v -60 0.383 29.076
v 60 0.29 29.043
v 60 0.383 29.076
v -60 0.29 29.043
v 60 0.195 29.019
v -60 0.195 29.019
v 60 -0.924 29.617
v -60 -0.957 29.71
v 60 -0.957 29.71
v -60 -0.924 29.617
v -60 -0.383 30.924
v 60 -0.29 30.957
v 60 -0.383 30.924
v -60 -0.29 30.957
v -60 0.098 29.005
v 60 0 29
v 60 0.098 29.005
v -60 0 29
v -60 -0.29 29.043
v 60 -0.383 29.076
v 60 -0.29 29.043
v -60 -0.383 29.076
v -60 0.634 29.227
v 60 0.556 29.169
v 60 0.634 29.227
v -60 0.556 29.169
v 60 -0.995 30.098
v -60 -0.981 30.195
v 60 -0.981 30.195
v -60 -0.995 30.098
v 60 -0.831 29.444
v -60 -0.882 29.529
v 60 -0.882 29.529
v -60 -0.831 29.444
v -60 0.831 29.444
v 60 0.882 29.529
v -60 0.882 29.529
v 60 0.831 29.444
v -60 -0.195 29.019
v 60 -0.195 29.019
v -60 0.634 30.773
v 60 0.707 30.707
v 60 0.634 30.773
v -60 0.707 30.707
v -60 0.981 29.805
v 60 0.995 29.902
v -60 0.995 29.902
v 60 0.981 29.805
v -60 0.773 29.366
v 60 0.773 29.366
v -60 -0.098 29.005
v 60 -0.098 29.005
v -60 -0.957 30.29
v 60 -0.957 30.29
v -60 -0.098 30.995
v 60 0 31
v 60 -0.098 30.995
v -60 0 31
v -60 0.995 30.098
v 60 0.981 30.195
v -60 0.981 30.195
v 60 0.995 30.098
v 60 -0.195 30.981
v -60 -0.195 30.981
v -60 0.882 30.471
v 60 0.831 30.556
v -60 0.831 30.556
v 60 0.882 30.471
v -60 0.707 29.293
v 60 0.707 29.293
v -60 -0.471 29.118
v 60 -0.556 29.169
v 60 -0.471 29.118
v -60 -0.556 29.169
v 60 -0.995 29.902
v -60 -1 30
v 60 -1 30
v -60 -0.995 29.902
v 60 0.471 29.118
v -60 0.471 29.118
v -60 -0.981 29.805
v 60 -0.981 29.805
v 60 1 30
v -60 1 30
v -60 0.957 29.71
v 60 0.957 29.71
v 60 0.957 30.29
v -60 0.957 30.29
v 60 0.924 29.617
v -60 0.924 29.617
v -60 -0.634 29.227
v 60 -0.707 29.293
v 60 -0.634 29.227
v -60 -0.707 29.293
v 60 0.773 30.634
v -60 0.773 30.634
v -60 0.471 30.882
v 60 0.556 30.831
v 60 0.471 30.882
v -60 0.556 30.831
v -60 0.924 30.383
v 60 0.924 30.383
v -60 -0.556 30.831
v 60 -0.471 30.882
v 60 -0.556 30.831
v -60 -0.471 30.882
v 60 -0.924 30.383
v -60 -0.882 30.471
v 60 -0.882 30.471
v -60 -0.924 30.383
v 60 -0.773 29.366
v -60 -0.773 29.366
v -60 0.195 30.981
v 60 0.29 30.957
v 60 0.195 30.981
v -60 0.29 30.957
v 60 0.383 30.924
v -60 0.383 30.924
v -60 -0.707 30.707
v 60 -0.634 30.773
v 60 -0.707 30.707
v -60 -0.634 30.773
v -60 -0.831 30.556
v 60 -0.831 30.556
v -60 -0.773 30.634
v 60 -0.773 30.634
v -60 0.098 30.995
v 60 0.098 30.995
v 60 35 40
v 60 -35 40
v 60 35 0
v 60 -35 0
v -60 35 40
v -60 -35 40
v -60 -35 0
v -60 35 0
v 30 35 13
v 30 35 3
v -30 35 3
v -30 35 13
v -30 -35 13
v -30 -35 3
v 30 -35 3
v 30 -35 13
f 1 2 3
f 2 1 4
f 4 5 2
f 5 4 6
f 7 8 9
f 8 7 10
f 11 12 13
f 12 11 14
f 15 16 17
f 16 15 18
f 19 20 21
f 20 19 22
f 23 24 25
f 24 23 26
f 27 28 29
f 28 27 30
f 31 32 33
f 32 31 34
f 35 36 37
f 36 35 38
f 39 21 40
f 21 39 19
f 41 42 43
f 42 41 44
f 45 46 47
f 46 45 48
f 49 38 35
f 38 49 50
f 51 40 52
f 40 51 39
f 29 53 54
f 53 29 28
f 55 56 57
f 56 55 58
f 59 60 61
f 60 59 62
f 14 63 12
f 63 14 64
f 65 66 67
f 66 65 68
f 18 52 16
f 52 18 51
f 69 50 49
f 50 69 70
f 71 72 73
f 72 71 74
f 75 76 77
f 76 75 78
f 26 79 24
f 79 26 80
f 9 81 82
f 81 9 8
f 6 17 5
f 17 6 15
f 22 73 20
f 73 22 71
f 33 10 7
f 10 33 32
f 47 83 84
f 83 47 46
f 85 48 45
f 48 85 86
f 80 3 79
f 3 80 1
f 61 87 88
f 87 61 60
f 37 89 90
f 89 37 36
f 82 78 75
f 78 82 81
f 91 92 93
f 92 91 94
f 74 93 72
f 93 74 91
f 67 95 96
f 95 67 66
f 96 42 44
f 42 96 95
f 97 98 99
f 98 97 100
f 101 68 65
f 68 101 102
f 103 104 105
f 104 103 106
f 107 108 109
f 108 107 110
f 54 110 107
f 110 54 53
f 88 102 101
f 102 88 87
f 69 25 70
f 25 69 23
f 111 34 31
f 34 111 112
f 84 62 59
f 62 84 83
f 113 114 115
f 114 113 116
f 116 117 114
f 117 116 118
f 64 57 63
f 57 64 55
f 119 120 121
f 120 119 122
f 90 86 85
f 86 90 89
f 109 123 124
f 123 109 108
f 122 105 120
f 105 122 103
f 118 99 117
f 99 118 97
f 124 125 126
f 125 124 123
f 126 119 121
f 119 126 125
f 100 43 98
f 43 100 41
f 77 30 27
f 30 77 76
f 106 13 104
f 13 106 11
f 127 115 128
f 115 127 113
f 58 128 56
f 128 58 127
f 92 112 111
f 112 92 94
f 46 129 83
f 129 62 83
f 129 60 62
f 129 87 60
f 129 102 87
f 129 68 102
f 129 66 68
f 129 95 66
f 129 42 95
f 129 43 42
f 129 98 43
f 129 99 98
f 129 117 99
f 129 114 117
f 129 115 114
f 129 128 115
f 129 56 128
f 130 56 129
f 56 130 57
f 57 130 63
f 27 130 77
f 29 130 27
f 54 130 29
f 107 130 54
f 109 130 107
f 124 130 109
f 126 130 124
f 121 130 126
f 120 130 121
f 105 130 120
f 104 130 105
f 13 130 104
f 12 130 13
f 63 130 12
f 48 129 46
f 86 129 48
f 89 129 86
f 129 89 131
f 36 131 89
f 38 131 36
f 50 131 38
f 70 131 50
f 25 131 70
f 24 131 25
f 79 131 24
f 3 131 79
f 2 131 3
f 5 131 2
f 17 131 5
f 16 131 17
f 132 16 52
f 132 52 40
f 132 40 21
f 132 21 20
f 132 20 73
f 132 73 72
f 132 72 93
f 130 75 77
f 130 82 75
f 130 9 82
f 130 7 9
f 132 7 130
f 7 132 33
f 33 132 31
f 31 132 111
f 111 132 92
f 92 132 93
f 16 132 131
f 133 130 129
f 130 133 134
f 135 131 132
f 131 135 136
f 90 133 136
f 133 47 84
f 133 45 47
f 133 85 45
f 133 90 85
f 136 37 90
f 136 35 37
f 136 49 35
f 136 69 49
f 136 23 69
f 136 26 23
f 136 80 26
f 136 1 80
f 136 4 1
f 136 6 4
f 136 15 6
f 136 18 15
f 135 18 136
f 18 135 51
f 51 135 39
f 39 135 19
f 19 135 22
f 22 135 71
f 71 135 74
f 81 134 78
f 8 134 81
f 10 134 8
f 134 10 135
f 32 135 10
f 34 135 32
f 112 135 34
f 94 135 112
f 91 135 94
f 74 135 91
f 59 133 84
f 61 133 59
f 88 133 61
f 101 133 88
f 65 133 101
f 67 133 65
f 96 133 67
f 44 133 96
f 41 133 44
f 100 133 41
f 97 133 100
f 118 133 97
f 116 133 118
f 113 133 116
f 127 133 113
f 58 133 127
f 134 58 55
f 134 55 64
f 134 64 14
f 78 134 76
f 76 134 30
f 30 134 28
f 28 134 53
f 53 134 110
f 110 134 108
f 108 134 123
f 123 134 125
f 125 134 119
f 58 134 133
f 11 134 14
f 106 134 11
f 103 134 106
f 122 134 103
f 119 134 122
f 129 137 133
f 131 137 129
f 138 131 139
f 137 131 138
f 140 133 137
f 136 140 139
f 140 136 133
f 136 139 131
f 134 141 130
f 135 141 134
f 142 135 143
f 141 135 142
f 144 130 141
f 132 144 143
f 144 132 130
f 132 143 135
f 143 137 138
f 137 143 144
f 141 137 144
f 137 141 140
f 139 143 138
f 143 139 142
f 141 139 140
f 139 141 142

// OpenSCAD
// Mini horizontal gel-electrophoresis box - buffer tank
// Print orientation: tank resting on XY plane, open top facing +Z

// ---------- Parameters ----------
outer_x      = 120;   // outer length in X (mm)
outer_y      = 70;    // outer width in Y (mm)
outer_z      = 40;    // outer height in Z (mm)
wall         = 3;     // wall thickness (mm)
floor        = 3;     // floor thickness (mm)
platform_x   = 60;    // platform length in X (mm)
platform_y   = 70;    // platform width in Y (mm)
platform_top = 13;    // platform top height above outer bottom (mm)
hole_d       = 2;     // electrode hole diameter (mm)
hole_y       = 0;     // electrode hole Y position (mm)
hole_z       = 30;    // electrode hole Z position (mm)
eps          = 0.5;   // cutter overshoot past faces (mm)

$fn = 64;

// ---------- Derived ----------
inner_x = outer_x - 2 * wall;   // 114 mm
inner_z = outer_z - floor;      // 37 mm (floor at z = 0..3)

// ---------- Model ----------
difference() {
    // Tank body (solid floor, open top)
    translate([-outer_x / 2, -outer_y / 2, 0])
        cube([outer_x, outer_y, outer_z]);

    // Raised platform for gel tray, centred in X
    translate([-platform_x / 2, -platform_y / 2, floor])
        cube([platform_x, platform_y, platform_top - floor]);

    // Horizontal electrode holes through each end wall along X
    for (sx = [-1, 1])
        translate([sx > 0 ? outer_x / 2 - eps : -outer_x / 2 - eps,
                   hole_y, hole_z])
            rotate([0, 90, 0])
                cylinder(d = hole_d, h = outer_x + 2 * eps);
}
